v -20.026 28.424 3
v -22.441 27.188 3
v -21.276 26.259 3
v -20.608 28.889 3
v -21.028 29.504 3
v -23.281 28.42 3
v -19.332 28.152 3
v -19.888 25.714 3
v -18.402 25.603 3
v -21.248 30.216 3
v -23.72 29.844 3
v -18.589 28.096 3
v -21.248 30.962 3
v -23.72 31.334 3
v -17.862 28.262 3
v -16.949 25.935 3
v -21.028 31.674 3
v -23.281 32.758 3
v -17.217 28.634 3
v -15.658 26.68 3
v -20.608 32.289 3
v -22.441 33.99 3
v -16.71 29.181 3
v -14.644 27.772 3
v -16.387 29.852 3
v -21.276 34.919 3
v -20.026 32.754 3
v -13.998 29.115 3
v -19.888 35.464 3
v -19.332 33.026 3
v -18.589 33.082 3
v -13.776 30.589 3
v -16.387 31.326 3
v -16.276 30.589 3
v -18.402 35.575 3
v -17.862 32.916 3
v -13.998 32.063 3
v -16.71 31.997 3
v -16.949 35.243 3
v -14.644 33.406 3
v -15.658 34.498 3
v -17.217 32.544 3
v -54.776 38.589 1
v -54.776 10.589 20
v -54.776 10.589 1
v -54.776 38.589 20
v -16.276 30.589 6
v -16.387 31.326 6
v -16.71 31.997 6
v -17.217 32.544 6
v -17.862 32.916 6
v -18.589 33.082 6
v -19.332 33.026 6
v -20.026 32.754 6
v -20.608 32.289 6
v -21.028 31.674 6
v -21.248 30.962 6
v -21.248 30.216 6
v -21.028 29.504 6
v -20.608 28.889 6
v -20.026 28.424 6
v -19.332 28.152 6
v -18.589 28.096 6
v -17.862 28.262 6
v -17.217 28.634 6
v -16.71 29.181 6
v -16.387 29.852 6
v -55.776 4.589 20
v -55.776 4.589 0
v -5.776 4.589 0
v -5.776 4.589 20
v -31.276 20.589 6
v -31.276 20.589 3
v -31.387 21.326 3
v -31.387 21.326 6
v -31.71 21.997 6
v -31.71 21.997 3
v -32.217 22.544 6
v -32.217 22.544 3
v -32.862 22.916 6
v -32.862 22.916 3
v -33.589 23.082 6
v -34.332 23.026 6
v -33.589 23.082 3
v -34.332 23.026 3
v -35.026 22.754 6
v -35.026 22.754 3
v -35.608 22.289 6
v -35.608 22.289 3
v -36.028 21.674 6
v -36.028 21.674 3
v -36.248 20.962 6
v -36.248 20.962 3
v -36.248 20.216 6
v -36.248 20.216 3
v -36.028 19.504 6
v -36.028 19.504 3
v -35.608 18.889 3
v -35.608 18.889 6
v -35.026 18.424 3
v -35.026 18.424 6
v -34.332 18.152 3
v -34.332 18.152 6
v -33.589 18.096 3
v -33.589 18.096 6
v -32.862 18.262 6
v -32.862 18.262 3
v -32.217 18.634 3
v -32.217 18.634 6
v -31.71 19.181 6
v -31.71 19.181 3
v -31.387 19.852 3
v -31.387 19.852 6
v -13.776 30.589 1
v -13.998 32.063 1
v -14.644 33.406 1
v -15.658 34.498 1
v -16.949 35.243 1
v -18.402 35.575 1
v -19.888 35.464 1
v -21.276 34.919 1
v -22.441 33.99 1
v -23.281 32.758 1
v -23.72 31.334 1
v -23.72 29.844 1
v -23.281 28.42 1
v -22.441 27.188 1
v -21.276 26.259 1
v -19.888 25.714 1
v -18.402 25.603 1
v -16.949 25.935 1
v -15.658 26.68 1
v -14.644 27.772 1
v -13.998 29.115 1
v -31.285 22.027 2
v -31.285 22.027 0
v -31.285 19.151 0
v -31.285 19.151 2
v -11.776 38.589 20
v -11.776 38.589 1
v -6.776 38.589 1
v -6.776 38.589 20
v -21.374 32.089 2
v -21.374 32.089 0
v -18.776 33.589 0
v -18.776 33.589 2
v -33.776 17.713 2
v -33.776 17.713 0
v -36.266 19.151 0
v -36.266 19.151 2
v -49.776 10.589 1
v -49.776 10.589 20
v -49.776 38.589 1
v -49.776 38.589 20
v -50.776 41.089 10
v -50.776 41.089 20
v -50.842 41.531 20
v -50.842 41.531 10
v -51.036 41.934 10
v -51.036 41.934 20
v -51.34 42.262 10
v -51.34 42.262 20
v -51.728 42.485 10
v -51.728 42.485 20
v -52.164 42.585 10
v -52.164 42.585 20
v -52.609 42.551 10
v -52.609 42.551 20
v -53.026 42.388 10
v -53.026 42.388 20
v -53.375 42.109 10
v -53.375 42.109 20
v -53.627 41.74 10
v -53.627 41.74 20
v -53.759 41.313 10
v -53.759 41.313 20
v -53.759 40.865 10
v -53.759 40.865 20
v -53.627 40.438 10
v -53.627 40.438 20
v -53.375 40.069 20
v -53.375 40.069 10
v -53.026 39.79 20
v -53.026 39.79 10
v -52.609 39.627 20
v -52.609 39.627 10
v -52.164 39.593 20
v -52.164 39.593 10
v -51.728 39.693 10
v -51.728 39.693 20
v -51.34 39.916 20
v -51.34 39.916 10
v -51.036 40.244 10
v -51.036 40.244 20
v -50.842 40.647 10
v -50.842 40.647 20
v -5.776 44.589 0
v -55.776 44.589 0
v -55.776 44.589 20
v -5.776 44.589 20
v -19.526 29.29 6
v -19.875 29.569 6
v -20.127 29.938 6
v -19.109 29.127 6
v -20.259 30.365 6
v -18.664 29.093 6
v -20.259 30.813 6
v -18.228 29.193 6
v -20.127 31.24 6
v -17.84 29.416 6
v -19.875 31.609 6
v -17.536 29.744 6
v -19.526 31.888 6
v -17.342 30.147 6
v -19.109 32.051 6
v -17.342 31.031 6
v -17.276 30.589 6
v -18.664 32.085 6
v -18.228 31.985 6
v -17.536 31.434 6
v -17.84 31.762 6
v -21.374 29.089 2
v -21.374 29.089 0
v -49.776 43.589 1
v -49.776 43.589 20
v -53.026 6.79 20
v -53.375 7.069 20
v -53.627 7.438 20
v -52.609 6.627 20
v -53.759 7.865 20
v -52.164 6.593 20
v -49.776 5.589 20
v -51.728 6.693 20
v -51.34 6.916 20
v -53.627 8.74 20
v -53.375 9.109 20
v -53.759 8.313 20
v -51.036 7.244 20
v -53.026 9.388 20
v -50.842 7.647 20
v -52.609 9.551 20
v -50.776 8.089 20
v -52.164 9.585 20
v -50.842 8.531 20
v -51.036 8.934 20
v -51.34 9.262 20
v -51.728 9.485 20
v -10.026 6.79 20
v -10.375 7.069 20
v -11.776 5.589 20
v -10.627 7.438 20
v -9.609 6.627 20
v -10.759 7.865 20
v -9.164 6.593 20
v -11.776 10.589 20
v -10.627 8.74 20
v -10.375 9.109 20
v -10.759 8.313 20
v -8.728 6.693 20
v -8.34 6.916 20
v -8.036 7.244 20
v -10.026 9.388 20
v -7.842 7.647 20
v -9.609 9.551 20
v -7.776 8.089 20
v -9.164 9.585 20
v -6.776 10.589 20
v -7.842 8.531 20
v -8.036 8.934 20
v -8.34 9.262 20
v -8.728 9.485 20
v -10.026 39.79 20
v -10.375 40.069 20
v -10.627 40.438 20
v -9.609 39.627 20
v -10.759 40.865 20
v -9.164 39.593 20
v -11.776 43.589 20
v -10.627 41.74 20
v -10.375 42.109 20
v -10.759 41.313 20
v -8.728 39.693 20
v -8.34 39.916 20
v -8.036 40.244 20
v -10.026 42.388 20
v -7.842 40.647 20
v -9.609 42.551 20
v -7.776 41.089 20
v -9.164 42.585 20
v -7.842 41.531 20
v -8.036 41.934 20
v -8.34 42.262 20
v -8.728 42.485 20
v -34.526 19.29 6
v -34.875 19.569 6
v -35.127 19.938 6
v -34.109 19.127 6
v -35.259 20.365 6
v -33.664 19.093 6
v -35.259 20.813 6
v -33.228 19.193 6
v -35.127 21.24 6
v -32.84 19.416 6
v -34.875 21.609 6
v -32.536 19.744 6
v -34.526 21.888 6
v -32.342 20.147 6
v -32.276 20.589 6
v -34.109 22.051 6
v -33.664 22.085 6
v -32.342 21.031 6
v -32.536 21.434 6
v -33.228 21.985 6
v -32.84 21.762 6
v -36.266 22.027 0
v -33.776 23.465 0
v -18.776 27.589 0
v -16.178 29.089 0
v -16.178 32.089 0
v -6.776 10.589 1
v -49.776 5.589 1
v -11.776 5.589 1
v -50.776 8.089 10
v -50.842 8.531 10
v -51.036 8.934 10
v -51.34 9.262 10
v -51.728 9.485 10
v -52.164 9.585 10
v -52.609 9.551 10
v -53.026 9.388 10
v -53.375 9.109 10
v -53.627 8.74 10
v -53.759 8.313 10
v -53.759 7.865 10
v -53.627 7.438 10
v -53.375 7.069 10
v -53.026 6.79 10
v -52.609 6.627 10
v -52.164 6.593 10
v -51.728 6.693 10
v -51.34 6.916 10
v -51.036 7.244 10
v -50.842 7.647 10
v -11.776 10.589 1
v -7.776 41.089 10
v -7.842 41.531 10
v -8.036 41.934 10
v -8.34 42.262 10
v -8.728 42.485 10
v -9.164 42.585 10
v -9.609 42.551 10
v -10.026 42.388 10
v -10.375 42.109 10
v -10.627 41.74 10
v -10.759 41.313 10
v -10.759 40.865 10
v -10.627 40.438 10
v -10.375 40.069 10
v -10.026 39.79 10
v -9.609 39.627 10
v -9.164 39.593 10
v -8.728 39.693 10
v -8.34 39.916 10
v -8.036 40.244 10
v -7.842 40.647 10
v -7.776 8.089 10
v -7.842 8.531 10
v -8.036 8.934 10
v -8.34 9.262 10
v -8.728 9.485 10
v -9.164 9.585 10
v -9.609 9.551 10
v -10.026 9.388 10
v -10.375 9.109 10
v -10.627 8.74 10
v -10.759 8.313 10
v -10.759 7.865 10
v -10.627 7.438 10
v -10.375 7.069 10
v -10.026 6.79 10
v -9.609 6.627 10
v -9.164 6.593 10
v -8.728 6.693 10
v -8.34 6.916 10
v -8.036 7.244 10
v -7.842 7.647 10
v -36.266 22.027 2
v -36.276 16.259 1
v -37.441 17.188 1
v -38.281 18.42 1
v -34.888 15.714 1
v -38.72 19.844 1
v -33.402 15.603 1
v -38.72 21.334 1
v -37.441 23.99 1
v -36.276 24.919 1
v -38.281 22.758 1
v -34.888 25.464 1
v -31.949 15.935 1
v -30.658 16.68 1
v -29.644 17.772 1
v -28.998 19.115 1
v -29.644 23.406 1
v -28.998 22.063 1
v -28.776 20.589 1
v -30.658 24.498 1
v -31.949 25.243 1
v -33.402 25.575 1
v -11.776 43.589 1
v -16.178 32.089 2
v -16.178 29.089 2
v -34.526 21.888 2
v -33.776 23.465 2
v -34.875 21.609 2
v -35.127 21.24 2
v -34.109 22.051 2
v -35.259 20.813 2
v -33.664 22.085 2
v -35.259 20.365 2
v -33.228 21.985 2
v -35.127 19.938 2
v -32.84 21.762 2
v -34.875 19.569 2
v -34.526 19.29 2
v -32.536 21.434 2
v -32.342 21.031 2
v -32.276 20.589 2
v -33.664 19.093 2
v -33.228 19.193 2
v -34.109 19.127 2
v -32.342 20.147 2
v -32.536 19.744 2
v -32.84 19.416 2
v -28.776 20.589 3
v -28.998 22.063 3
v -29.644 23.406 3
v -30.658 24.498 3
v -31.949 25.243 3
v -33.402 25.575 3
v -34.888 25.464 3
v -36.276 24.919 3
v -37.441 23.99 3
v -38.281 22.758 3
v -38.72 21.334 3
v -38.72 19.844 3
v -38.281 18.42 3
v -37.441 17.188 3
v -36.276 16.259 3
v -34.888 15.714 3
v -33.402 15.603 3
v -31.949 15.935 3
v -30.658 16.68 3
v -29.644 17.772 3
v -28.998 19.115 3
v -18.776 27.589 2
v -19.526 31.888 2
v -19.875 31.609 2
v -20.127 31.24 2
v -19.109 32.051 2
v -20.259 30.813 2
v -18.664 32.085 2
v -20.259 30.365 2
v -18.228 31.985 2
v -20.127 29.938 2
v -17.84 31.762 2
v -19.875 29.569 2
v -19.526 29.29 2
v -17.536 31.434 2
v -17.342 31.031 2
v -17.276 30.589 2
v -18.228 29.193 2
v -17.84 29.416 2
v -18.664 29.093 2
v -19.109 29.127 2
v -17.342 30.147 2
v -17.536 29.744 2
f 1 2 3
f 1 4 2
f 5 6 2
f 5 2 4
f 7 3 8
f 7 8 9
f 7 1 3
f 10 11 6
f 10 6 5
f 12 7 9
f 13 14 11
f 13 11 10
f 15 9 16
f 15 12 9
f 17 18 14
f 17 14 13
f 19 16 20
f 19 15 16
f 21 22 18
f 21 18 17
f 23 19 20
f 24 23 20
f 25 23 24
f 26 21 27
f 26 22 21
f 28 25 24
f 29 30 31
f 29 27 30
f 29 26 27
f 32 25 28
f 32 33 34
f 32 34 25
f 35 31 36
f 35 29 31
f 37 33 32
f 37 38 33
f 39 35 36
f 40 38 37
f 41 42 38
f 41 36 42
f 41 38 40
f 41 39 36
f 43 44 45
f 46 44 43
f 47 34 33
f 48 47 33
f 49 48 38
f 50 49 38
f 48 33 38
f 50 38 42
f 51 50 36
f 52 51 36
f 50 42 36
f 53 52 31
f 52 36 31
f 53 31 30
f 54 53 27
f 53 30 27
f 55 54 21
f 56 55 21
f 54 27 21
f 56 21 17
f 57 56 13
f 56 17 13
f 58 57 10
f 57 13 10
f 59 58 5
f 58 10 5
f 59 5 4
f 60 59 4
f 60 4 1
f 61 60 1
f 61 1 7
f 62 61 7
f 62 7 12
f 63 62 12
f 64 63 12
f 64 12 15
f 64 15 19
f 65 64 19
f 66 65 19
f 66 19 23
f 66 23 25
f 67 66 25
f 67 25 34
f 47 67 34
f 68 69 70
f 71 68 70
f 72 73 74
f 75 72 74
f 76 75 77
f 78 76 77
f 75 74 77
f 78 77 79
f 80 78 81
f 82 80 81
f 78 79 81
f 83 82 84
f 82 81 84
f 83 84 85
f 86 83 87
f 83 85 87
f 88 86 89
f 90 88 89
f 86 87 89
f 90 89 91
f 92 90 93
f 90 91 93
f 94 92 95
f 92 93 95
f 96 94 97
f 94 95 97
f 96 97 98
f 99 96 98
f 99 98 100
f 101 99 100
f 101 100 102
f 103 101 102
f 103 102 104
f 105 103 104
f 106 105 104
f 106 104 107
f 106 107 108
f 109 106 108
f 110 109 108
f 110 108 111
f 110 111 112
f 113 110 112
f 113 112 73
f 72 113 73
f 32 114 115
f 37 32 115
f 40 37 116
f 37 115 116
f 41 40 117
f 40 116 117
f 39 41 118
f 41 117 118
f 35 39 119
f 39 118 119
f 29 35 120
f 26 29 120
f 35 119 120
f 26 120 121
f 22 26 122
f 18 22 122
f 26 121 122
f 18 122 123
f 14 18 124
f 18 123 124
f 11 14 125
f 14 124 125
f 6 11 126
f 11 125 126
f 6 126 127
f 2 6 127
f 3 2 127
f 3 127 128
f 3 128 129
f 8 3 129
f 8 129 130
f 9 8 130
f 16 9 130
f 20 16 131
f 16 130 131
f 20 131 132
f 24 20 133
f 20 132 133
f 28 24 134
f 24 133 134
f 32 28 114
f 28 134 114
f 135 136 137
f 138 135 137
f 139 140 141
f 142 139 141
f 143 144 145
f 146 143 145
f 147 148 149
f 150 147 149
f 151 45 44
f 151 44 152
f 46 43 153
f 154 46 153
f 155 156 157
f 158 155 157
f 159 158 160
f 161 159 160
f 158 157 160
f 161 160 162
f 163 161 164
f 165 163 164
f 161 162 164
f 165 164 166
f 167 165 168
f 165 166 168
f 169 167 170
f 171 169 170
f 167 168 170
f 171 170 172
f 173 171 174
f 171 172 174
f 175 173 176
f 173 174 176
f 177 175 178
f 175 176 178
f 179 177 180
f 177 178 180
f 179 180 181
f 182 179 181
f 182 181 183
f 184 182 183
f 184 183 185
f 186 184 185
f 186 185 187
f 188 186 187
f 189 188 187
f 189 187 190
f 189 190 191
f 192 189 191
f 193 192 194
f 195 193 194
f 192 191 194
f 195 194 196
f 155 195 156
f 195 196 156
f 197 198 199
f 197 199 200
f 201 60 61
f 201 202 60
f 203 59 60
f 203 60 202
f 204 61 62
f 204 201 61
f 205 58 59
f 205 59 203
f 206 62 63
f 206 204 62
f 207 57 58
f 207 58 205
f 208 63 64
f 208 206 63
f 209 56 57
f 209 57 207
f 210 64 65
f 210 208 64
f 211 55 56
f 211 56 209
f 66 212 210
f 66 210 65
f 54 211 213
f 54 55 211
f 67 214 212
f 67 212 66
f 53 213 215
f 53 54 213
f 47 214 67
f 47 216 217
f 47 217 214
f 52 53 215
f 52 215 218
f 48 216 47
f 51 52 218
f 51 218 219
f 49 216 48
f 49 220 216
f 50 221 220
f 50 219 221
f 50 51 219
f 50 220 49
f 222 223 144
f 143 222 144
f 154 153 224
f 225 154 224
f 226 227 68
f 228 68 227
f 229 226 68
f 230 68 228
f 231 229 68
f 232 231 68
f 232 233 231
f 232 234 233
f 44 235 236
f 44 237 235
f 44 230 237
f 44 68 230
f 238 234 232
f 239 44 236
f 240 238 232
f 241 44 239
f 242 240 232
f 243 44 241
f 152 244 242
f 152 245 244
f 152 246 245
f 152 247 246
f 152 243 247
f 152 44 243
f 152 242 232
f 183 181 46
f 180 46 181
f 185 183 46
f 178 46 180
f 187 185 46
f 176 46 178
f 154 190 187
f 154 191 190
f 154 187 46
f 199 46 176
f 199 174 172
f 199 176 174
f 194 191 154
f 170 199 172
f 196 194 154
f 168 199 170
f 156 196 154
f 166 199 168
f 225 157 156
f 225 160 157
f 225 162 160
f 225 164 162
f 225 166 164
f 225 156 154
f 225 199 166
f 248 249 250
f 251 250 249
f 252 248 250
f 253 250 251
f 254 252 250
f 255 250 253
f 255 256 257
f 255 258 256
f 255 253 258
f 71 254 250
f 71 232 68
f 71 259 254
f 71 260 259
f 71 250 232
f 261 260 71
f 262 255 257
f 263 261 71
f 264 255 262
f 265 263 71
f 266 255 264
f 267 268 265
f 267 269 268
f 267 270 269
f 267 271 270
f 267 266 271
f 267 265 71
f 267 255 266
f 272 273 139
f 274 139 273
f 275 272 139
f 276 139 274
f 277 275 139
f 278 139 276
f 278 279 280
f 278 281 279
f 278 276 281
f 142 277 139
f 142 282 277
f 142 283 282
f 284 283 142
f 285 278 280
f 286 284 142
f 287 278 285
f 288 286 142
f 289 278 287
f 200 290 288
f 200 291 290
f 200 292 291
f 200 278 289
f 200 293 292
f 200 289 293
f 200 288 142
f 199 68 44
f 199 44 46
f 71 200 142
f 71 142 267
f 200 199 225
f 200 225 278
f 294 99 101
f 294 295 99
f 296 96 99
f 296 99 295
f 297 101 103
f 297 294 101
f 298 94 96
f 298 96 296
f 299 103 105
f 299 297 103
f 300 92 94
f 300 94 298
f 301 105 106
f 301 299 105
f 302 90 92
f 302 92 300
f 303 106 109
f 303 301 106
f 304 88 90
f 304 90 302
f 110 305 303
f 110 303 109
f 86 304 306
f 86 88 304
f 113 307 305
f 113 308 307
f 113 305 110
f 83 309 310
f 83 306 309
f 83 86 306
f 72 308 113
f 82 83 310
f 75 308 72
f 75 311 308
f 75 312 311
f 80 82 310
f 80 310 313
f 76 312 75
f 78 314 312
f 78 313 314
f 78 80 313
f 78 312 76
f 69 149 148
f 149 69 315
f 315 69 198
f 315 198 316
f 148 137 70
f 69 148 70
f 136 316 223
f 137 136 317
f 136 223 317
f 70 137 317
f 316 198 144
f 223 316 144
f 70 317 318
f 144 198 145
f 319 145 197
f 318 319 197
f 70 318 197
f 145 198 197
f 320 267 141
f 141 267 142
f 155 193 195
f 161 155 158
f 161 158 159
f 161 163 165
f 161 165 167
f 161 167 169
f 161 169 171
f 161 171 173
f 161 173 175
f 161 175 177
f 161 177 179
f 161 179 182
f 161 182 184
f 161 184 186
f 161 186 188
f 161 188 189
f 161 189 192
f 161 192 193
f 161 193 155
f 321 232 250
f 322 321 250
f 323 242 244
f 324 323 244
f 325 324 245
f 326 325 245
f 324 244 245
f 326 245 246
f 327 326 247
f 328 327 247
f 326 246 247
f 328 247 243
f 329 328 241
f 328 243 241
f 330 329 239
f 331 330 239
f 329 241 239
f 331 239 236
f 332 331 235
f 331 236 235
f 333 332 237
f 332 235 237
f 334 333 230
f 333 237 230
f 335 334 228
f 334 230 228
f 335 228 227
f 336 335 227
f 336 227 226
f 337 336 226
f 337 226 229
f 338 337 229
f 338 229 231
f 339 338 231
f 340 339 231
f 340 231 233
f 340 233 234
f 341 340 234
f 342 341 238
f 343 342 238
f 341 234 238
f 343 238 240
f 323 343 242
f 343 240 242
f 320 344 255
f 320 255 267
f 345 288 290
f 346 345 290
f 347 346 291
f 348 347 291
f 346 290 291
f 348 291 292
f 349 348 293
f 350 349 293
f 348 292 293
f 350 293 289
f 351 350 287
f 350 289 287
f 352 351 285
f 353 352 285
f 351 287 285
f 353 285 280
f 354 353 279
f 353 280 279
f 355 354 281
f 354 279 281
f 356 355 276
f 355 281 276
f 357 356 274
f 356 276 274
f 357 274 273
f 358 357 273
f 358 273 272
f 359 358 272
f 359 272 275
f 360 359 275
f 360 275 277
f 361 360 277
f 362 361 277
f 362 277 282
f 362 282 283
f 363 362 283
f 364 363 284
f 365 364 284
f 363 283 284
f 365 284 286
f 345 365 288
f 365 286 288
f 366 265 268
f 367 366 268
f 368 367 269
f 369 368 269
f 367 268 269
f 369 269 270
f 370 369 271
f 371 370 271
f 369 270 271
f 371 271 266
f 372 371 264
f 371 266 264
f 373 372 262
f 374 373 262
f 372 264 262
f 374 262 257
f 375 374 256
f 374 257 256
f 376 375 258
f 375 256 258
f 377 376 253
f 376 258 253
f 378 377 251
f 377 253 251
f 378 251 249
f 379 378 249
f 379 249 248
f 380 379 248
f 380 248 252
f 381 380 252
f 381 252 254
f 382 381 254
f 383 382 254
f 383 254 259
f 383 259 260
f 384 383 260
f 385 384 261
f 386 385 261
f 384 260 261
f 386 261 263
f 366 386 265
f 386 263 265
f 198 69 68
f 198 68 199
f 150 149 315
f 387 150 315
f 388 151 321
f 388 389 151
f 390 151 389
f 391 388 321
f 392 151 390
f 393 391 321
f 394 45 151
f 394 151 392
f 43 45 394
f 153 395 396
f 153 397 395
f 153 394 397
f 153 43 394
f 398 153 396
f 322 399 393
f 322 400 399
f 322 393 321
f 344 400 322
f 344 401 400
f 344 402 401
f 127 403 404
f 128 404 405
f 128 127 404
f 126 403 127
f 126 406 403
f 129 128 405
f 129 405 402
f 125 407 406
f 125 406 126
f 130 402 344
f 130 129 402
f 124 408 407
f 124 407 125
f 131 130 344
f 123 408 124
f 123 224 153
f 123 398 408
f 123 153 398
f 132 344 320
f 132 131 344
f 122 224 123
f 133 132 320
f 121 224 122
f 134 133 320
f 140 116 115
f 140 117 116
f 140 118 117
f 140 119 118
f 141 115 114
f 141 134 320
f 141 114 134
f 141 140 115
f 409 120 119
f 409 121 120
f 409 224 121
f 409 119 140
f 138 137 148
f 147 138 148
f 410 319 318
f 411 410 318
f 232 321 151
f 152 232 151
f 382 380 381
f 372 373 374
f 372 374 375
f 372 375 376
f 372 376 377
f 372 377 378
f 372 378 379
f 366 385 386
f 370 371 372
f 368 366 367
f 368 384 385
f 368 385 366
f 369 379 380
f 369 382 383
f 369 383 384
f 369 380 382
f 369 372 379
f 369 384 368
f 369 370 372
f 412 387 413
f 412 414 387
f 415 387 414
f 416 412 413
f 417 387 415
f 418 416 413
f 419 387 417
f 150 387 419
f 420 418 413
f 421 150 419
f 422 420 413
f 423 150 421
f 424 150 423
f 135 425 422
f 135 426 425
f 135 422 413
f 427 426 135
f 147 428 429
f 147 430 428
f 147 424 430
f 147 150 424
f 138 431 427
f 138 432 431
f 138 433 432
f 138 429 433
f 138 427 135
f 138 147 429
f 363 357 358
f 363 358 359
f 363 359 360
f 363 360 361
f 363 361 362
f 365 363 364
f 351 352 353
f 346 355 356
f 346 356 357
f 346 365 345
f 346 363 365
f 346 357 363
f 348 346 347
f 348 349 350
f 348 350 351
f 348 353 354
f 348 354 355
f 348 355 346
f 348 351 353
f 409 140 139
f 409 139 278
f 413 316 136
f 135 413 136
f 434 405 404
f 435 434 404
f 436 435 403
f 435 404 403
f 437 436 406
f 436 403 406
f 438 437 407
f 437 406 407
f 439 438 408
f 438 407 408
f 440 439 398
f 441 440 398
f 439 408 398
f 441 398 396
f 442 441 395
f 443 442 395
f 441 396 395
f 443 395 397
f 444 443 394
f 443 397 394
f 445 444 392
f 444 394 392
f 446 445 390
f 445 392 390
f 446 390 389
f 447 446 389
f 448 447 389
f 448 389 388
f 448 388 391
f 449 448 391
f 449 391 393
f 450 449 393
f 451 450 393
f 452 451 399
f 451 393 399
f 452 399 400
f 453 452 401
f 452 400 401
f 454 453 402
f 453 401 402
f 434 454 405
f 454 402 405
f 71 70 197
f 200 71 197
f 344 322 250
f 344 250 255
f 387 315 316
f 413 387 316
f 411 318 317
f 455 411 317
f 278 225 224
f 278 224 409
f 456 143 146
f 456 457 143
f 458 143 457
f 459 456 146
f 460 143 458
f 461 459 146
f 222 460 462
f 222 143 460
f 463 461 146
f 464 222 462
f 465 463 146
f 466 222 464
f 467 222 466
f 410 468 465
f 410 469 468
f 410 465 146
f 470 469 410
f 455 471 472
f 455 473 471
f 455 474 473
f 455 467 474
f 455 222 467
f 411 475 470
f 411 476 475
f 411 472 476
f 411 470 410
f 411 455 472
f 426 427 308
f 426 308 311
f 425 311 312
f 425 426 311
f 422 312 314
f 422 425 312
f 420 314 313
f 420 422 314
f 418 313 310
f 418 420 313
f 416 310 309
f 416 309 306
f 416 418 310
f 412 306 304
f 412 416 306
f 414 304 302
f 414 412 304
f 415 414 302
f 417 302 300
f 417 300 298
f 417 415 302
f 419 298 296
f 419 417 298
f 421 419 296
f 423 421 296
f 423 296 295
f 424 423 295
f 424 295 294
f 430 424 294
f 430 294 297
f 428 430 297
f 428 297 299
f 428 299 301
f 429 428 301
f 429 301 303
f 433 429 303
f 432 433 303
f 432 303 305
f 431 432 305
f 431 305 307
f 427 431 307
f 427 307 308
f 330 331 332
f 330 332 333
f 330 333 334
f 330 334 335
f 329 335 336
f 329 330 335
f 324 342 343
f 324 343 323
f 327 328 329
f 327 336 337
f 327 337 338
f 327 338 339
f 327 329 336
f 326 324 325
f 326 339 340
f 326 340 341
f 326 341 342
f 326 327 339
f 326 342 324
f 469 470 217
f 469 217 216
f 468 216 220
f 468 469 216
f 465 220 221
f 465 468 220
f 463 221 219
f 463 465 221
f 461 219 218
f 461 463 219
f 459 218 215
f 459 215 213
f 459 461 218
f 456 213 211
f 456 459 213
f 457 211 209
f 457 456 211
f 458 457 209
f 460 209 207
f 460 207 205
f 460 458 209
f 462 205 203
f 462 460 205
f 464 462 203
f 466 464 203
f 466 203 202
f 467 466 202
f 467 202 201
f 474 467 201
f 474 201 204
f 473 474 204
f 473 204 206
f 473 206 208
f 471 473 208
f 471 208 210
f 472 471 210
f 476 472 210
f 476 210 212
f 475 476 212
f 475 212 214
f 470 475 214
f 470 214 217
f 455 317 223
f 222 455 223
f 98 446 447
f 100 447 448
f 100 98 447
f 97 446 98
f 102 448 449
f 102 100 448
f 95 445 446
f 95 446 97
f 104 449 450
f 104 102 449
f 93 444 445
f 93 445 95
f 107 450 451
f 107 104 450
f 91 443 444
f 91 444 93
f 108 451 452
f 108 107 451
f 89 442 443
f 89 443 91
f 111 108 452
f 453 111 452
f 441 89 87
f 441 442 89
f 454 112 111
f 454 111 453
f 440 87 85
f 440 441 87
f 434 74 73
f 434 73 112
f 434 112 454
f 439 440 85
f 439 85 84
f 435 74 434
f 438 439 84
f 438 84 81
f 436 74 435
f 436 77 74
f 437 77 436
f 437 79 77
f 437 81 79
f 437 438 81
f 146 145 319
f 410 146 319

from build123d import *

# Parameters (mm, degrees)
F0_W      = 50
F0_H      = 40
F1_DEPTH  = 20
F2_W      = 48
F2_H      = 38
F3_DEPTH  = 19
F4_W      = 5
F4_H      = 5
F5_DEPTH  = 19
F6_R      = 1.5
F7_DEPTH  = 10
F8_R      = 2.5
F8_R_2    = 1.5
F9_DEPTH  = 5
F10_DEPTH = 2
F11_R     = 5
F11_R_2   = 2.5
F12_DEPTH = 2
F13_R     = 1.5
F14_DEPTH = 2


with BuildPart() as f1:
    # F0 (on Top) → F1 (new body)
    with BuildSketch(Plane.XY):
        with Locations((-30.7756610087, 24.588953238)):
            Rectangle(F0_W, F0_H)
    extrude(amount=F1_DEPTH)

    # F2 (on face) → F3 (cut)
    with BuildSketch(Plane.XY.offset(20)):
        with Locations((-30.7756610087, 24.588953238)):
            Rectangle(F2_W, F2_H)
    extrude(amount=-F3_DEPTH, mode=Mode.SUBTRACT)

    # F4 (on face) → F5 (join)
    with BuildSketch(Plane.XY.offset(1)):
        with Locations((-52.2756610087, 41.088953238)):
            Rectangle(F4_W, F4_H)
        with Locations((-9.2756610087, 41.088953238)):
            Rectangle(F4_W, F4_H)
        with Locations((-9.2756610087, 8.088953238)):
            Rectangle(F4_W, F4_H)
        with Locations((-52.2756610087, 8.088953238)):
            Rectangle(F4_W, F4_H)
    extrude(amount=F5_DEPTH)

    # F6 (on face) → F7 (cut)
    with BuildSketch(Plane.XY.offset(20)):
        with Locations((-52.2756610087, 8.088953238)):
            Circle(F6_R)
        with Locations((-52.2756610087, 41.088953238)):
            Circle(F6_R)
        with Locations((-9.2756610087, 41.088953238)):
            Circle(F6_R)
        with Locations((-9.2756610087, 8.088953238)):
            Circle(F6_R)
    extrude(amount=-F7_DEPTH, mode=Mode.SUBTRACT)

    # F8 (on face) → F9 (join)
    with BuildSketch(Plane.XY.offset(1)):
        with Locations((-33.7756610087, 20.588953238)):
            Circle(F8_R)
        with Locations((-33.7756610087, 20.588953238)):
            Circle(F8_R_2, mode=Mode.SUBTRACT)
        with Locations((-18.7756610087, 30.588953238)):
            Circle(F8_R)
        with Locations((-18.7756610087, 30.588953238)):
            Circle(F8_R_2, mode=Mode.SUBTRACT)
    extrude(amount=F9_DEPTH)

    # F10 (cut): faces of the model
    f10_faces = [f1.faces().sort_by_distance(p)[0] for p in [
        (-33.7756610087, 20.588953238, 1),
        (-18.7756610087, 30.588953238, 1),
    ]]
    extrude(f10_faces, amount=-F10_DEPTH, mode=Mode.SUBTRACT)

    # F11 (on face) → F12 (join)
    with BuildSketch(Plane.XY.offset(1)):
        with Locations((-18.7756610087, 30.588953238)):
            Circle(F11_R)
        with Locations((-18.7756610087, 30.588953238)):
            Circle(F11_R_2, mode=Mode.SUBTRACT)
        with Locations((-33.7756610087, 20.588953238)):
            Circle(F11_R)
        with Locations((-33.7756610087, 20.588953238)):
            Circle(F11_R_2, mode=Mode.SUBTRACT)
    extrude(amount=F12_DEPTH)

    # F13 (on face) → F14 (cut)
    with BuildSketch(Plane(origin=(0, 0, 0), x_dir=(1, 0, 0), z_dir=(0, 0, -1))):
        Polygon((-16.1775847973, -32.088953238), (-16.1775847973, -29.088953238), (-18.7756610087, -27.588953238), (-21.37373722, -29.088953238), (-21.37373722, -32.088953238), (-18.7756610087, -33.588953238), align=None)
        with Locations((-18.7756610087, -30.588953238)):
            Circle(F13_R, mode=Mode.SUBTRACT)
        Polygon((-31.2851968259, -22.0268234043), (-31.2851968259, -19.1510830716), (-33.7756610087, -17.7132129053), (-36.2661251915, -19.1510830716), (-36.2661251915, -22.0268234043), (-33.7756610087, -23.4646935706), align=None)
        with Locations((-33.7756610087, -20.588953238)):
            Circle(F13_R, mode=Mode.SUBTRACT)
    extrude(amount=-F14_DEPTH, mode=Mode.SUBTRACT)


solid = f1.part
